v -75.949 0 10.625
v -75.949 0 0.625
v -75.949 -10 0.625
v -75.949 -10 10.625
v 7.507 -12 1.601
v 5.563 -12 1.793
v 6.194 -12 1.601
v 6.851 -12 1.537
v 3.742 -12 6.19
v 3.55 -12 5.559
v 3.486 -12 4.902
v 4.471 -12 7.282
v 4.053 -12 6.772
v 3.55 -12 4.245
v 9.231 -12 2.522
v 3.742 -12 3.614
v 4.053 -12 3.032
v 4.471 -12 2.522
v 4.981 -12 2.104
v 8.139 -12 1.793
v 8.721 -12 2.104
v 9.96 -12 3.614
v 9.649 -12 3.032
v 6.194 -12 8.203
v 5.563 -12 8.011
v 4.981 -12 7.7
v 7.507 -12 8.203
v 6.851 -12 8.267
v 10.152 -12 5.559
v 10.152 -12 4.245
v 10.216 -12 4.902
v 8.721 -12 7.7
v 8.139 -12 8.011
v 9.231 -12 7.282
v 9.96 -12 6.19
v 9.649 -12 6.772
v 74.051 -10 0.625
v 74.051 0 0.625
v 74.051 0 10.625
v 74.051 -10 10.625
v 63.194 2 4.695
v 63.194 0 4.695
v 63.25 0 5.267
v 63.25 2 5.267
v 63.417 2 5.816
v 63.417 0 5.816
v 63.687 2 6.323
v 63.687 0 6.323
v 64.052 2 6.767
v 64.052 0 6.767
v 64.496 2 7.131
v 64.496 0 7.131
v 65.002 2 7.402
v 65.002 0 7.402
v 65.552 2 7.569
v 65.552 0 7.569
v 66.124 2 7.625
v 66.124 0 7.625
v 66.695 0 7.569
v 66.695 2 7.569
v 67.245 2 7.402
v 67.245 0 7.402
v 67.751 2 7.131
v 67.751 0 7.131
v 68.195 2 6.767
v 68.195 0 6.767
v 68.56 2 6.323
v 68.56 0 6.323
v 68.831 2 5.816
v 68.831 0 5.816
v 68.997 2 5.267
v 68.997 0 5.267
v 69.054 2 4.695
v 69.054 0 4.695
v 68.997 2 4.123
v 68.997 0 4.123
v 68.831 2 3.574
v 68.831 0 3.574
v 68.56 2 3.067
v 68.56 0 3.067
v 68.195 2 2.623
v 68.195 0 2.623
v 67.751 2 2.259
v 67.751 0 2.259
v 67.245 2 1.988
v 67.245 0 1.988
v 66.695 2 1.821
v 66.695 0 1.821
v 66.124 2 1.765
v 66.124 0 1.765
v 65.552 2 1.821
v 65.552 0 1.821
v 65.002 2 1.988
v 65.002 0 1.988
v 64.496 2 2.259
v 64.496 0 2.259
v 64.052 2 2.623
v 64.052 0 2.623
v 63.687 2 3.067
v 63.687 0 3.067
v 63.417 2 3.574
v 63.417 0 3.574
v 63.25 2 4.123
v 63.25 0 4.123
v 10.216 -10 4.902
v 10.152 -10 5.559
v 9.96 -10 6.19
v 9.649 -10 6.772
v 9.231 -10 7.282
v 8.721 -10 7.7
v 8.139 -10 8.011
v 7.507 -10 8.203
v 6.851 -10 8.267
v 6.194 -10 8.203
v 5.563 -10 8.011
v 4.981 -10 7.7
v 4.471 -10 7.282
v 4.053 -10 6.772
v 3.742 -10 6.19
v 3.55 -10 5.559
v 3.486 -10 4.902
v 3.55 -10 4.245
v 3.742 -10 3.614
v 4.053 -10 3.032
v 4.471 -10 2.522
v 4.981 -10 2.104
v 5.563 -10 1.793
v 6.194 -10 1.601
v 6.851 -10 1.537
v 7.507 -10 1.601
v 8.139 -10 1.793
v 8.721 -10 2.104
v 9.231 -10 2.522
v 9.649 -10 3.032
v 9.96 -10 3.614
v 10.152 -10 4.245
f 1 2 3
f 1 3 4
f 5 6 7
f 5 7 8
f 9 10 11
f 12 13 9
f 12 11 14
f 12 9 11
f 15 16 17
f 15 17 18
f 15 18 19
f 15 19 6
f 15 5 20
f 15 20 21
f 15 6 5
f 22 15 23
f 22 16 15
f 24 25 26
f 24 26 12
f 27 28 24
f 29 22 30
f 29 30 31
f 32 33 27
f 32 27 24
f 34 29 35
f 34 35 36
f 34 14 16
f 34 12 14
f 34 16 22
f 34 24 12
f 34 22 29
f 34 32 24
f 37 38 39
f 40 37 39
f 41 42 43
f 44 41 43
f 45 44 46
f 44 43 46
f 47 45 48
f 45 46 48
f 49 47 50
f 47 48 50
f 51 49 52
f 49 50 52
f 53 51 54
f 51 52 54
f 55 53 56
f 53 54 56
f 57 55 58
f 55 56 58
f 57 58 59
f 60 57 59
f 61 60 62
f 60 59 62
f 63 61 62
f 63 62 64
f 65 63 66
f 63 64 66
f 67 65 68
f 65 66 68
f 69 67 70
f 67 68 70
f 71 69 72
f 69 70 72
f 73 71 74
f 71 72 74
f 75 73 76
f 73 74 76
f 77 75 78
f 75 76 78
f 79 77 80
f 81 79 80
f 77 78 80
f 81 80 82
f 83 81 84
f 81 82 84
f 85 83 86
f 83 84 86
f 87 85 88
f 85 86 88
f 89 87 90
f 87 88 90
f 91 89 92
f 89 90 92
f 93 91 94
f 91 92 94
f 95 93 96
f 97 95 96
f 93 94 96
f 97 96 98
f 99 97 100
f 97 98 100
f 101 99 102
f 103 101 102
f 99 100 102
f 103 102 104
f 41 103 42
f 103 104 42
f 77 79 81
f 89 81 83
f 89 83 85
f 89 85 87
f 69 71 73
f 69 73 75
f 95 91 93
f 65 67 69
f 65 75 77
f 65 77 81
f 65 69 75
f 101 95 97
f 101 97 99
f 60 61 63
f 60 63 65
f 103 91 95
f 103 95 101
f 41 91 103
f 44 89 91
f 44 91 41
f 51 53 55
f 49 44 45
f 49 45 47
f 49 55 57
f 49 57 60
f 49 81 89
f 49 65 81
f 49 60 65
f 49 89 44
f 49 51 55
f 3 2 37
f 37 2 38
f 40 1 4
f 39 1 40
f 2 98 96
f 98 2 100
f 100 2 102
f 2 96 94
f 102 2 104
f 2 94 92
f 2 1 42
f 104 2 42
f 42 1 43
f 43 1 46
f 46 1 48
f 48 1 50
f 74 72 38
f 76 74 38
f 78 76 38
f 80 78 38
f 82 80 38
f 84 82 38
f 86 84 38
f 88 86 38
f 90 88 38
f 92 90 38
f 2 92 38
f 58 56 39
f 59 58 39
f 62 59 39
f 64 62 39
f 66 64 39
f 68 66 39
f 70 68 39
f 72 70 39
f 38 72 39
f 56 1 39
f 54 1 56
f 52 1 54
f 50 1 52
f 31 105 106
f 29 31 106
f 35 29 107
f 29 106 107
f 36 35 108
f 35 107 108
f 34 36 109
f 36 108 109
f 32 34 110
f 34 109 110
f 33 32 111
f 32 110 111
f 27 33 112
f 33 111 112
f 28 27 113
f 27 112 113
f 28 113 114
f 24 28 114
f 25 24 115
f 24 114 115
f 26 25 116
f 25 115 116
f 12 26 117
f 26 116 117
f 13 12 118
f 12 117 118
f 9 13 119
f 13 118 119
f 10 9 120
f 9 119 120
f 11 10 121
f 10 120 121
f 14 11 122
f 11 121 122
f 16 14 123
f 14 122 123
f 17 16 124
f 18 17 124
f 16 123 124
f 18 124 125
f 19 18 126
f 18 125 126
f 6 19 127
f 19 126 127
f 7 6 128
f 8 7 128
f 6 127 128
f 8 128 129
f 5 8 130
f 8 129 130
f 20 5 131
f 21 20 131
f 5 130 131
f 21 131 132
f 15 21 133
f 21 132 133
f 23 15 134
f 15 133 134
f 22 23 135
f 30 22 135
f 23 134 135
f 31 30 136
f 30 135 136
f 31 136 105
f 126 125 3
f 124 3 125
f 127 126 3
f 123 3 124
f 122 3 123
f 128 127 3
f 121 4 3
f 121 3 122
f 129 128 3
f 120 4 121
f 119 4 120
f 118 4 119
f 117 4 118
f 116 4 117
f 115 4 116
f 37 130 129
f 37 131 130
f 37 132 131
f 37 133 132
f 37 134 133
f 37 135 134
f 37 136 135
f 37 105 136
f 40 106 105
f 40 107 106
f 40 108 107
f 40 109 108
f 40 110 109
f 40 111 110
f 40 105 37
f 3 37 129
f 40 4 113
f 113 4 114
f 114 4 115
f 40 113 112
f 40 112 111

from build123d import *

# Parameters (mm, degrees)
F0_W     = 150
F0_H     = 10
F1_DEPTH = 10
F3_R     = 3.365379
F4_DEPTH = 2
F2_R     = 2.92998
F5_DEPTH = 2


with BuildPart() as f1:
    # F0 (on Front) → F1 (new body)
    with BuildSketch(Plane.XZ):
        with Locations((-0.948794, 5.625204)):
            Rectangle(F0_W, F0_H)
    extrude(amount=F1_DEPTH)

    # F3 (on face) → F4 (join)
    with BuildSketch(Plane.XZ.offset(10)):
        with Locations((6.850945, 4.902036)):
            Circle(F3_R)
    extrude(amount=F4_DEPTH)

    # F2 (on face) → F5 (join)
    with BuildSketch(Plane(origin=(0, 0, 0), x_dir=(-1, 0, 0), z_dir=(0, 1, 0))):
        with Locations((-66.123568, 4.694908)):
            Circle(F2_R)
    extrude(amount=F5_DEPTH)


solid = f1.part
